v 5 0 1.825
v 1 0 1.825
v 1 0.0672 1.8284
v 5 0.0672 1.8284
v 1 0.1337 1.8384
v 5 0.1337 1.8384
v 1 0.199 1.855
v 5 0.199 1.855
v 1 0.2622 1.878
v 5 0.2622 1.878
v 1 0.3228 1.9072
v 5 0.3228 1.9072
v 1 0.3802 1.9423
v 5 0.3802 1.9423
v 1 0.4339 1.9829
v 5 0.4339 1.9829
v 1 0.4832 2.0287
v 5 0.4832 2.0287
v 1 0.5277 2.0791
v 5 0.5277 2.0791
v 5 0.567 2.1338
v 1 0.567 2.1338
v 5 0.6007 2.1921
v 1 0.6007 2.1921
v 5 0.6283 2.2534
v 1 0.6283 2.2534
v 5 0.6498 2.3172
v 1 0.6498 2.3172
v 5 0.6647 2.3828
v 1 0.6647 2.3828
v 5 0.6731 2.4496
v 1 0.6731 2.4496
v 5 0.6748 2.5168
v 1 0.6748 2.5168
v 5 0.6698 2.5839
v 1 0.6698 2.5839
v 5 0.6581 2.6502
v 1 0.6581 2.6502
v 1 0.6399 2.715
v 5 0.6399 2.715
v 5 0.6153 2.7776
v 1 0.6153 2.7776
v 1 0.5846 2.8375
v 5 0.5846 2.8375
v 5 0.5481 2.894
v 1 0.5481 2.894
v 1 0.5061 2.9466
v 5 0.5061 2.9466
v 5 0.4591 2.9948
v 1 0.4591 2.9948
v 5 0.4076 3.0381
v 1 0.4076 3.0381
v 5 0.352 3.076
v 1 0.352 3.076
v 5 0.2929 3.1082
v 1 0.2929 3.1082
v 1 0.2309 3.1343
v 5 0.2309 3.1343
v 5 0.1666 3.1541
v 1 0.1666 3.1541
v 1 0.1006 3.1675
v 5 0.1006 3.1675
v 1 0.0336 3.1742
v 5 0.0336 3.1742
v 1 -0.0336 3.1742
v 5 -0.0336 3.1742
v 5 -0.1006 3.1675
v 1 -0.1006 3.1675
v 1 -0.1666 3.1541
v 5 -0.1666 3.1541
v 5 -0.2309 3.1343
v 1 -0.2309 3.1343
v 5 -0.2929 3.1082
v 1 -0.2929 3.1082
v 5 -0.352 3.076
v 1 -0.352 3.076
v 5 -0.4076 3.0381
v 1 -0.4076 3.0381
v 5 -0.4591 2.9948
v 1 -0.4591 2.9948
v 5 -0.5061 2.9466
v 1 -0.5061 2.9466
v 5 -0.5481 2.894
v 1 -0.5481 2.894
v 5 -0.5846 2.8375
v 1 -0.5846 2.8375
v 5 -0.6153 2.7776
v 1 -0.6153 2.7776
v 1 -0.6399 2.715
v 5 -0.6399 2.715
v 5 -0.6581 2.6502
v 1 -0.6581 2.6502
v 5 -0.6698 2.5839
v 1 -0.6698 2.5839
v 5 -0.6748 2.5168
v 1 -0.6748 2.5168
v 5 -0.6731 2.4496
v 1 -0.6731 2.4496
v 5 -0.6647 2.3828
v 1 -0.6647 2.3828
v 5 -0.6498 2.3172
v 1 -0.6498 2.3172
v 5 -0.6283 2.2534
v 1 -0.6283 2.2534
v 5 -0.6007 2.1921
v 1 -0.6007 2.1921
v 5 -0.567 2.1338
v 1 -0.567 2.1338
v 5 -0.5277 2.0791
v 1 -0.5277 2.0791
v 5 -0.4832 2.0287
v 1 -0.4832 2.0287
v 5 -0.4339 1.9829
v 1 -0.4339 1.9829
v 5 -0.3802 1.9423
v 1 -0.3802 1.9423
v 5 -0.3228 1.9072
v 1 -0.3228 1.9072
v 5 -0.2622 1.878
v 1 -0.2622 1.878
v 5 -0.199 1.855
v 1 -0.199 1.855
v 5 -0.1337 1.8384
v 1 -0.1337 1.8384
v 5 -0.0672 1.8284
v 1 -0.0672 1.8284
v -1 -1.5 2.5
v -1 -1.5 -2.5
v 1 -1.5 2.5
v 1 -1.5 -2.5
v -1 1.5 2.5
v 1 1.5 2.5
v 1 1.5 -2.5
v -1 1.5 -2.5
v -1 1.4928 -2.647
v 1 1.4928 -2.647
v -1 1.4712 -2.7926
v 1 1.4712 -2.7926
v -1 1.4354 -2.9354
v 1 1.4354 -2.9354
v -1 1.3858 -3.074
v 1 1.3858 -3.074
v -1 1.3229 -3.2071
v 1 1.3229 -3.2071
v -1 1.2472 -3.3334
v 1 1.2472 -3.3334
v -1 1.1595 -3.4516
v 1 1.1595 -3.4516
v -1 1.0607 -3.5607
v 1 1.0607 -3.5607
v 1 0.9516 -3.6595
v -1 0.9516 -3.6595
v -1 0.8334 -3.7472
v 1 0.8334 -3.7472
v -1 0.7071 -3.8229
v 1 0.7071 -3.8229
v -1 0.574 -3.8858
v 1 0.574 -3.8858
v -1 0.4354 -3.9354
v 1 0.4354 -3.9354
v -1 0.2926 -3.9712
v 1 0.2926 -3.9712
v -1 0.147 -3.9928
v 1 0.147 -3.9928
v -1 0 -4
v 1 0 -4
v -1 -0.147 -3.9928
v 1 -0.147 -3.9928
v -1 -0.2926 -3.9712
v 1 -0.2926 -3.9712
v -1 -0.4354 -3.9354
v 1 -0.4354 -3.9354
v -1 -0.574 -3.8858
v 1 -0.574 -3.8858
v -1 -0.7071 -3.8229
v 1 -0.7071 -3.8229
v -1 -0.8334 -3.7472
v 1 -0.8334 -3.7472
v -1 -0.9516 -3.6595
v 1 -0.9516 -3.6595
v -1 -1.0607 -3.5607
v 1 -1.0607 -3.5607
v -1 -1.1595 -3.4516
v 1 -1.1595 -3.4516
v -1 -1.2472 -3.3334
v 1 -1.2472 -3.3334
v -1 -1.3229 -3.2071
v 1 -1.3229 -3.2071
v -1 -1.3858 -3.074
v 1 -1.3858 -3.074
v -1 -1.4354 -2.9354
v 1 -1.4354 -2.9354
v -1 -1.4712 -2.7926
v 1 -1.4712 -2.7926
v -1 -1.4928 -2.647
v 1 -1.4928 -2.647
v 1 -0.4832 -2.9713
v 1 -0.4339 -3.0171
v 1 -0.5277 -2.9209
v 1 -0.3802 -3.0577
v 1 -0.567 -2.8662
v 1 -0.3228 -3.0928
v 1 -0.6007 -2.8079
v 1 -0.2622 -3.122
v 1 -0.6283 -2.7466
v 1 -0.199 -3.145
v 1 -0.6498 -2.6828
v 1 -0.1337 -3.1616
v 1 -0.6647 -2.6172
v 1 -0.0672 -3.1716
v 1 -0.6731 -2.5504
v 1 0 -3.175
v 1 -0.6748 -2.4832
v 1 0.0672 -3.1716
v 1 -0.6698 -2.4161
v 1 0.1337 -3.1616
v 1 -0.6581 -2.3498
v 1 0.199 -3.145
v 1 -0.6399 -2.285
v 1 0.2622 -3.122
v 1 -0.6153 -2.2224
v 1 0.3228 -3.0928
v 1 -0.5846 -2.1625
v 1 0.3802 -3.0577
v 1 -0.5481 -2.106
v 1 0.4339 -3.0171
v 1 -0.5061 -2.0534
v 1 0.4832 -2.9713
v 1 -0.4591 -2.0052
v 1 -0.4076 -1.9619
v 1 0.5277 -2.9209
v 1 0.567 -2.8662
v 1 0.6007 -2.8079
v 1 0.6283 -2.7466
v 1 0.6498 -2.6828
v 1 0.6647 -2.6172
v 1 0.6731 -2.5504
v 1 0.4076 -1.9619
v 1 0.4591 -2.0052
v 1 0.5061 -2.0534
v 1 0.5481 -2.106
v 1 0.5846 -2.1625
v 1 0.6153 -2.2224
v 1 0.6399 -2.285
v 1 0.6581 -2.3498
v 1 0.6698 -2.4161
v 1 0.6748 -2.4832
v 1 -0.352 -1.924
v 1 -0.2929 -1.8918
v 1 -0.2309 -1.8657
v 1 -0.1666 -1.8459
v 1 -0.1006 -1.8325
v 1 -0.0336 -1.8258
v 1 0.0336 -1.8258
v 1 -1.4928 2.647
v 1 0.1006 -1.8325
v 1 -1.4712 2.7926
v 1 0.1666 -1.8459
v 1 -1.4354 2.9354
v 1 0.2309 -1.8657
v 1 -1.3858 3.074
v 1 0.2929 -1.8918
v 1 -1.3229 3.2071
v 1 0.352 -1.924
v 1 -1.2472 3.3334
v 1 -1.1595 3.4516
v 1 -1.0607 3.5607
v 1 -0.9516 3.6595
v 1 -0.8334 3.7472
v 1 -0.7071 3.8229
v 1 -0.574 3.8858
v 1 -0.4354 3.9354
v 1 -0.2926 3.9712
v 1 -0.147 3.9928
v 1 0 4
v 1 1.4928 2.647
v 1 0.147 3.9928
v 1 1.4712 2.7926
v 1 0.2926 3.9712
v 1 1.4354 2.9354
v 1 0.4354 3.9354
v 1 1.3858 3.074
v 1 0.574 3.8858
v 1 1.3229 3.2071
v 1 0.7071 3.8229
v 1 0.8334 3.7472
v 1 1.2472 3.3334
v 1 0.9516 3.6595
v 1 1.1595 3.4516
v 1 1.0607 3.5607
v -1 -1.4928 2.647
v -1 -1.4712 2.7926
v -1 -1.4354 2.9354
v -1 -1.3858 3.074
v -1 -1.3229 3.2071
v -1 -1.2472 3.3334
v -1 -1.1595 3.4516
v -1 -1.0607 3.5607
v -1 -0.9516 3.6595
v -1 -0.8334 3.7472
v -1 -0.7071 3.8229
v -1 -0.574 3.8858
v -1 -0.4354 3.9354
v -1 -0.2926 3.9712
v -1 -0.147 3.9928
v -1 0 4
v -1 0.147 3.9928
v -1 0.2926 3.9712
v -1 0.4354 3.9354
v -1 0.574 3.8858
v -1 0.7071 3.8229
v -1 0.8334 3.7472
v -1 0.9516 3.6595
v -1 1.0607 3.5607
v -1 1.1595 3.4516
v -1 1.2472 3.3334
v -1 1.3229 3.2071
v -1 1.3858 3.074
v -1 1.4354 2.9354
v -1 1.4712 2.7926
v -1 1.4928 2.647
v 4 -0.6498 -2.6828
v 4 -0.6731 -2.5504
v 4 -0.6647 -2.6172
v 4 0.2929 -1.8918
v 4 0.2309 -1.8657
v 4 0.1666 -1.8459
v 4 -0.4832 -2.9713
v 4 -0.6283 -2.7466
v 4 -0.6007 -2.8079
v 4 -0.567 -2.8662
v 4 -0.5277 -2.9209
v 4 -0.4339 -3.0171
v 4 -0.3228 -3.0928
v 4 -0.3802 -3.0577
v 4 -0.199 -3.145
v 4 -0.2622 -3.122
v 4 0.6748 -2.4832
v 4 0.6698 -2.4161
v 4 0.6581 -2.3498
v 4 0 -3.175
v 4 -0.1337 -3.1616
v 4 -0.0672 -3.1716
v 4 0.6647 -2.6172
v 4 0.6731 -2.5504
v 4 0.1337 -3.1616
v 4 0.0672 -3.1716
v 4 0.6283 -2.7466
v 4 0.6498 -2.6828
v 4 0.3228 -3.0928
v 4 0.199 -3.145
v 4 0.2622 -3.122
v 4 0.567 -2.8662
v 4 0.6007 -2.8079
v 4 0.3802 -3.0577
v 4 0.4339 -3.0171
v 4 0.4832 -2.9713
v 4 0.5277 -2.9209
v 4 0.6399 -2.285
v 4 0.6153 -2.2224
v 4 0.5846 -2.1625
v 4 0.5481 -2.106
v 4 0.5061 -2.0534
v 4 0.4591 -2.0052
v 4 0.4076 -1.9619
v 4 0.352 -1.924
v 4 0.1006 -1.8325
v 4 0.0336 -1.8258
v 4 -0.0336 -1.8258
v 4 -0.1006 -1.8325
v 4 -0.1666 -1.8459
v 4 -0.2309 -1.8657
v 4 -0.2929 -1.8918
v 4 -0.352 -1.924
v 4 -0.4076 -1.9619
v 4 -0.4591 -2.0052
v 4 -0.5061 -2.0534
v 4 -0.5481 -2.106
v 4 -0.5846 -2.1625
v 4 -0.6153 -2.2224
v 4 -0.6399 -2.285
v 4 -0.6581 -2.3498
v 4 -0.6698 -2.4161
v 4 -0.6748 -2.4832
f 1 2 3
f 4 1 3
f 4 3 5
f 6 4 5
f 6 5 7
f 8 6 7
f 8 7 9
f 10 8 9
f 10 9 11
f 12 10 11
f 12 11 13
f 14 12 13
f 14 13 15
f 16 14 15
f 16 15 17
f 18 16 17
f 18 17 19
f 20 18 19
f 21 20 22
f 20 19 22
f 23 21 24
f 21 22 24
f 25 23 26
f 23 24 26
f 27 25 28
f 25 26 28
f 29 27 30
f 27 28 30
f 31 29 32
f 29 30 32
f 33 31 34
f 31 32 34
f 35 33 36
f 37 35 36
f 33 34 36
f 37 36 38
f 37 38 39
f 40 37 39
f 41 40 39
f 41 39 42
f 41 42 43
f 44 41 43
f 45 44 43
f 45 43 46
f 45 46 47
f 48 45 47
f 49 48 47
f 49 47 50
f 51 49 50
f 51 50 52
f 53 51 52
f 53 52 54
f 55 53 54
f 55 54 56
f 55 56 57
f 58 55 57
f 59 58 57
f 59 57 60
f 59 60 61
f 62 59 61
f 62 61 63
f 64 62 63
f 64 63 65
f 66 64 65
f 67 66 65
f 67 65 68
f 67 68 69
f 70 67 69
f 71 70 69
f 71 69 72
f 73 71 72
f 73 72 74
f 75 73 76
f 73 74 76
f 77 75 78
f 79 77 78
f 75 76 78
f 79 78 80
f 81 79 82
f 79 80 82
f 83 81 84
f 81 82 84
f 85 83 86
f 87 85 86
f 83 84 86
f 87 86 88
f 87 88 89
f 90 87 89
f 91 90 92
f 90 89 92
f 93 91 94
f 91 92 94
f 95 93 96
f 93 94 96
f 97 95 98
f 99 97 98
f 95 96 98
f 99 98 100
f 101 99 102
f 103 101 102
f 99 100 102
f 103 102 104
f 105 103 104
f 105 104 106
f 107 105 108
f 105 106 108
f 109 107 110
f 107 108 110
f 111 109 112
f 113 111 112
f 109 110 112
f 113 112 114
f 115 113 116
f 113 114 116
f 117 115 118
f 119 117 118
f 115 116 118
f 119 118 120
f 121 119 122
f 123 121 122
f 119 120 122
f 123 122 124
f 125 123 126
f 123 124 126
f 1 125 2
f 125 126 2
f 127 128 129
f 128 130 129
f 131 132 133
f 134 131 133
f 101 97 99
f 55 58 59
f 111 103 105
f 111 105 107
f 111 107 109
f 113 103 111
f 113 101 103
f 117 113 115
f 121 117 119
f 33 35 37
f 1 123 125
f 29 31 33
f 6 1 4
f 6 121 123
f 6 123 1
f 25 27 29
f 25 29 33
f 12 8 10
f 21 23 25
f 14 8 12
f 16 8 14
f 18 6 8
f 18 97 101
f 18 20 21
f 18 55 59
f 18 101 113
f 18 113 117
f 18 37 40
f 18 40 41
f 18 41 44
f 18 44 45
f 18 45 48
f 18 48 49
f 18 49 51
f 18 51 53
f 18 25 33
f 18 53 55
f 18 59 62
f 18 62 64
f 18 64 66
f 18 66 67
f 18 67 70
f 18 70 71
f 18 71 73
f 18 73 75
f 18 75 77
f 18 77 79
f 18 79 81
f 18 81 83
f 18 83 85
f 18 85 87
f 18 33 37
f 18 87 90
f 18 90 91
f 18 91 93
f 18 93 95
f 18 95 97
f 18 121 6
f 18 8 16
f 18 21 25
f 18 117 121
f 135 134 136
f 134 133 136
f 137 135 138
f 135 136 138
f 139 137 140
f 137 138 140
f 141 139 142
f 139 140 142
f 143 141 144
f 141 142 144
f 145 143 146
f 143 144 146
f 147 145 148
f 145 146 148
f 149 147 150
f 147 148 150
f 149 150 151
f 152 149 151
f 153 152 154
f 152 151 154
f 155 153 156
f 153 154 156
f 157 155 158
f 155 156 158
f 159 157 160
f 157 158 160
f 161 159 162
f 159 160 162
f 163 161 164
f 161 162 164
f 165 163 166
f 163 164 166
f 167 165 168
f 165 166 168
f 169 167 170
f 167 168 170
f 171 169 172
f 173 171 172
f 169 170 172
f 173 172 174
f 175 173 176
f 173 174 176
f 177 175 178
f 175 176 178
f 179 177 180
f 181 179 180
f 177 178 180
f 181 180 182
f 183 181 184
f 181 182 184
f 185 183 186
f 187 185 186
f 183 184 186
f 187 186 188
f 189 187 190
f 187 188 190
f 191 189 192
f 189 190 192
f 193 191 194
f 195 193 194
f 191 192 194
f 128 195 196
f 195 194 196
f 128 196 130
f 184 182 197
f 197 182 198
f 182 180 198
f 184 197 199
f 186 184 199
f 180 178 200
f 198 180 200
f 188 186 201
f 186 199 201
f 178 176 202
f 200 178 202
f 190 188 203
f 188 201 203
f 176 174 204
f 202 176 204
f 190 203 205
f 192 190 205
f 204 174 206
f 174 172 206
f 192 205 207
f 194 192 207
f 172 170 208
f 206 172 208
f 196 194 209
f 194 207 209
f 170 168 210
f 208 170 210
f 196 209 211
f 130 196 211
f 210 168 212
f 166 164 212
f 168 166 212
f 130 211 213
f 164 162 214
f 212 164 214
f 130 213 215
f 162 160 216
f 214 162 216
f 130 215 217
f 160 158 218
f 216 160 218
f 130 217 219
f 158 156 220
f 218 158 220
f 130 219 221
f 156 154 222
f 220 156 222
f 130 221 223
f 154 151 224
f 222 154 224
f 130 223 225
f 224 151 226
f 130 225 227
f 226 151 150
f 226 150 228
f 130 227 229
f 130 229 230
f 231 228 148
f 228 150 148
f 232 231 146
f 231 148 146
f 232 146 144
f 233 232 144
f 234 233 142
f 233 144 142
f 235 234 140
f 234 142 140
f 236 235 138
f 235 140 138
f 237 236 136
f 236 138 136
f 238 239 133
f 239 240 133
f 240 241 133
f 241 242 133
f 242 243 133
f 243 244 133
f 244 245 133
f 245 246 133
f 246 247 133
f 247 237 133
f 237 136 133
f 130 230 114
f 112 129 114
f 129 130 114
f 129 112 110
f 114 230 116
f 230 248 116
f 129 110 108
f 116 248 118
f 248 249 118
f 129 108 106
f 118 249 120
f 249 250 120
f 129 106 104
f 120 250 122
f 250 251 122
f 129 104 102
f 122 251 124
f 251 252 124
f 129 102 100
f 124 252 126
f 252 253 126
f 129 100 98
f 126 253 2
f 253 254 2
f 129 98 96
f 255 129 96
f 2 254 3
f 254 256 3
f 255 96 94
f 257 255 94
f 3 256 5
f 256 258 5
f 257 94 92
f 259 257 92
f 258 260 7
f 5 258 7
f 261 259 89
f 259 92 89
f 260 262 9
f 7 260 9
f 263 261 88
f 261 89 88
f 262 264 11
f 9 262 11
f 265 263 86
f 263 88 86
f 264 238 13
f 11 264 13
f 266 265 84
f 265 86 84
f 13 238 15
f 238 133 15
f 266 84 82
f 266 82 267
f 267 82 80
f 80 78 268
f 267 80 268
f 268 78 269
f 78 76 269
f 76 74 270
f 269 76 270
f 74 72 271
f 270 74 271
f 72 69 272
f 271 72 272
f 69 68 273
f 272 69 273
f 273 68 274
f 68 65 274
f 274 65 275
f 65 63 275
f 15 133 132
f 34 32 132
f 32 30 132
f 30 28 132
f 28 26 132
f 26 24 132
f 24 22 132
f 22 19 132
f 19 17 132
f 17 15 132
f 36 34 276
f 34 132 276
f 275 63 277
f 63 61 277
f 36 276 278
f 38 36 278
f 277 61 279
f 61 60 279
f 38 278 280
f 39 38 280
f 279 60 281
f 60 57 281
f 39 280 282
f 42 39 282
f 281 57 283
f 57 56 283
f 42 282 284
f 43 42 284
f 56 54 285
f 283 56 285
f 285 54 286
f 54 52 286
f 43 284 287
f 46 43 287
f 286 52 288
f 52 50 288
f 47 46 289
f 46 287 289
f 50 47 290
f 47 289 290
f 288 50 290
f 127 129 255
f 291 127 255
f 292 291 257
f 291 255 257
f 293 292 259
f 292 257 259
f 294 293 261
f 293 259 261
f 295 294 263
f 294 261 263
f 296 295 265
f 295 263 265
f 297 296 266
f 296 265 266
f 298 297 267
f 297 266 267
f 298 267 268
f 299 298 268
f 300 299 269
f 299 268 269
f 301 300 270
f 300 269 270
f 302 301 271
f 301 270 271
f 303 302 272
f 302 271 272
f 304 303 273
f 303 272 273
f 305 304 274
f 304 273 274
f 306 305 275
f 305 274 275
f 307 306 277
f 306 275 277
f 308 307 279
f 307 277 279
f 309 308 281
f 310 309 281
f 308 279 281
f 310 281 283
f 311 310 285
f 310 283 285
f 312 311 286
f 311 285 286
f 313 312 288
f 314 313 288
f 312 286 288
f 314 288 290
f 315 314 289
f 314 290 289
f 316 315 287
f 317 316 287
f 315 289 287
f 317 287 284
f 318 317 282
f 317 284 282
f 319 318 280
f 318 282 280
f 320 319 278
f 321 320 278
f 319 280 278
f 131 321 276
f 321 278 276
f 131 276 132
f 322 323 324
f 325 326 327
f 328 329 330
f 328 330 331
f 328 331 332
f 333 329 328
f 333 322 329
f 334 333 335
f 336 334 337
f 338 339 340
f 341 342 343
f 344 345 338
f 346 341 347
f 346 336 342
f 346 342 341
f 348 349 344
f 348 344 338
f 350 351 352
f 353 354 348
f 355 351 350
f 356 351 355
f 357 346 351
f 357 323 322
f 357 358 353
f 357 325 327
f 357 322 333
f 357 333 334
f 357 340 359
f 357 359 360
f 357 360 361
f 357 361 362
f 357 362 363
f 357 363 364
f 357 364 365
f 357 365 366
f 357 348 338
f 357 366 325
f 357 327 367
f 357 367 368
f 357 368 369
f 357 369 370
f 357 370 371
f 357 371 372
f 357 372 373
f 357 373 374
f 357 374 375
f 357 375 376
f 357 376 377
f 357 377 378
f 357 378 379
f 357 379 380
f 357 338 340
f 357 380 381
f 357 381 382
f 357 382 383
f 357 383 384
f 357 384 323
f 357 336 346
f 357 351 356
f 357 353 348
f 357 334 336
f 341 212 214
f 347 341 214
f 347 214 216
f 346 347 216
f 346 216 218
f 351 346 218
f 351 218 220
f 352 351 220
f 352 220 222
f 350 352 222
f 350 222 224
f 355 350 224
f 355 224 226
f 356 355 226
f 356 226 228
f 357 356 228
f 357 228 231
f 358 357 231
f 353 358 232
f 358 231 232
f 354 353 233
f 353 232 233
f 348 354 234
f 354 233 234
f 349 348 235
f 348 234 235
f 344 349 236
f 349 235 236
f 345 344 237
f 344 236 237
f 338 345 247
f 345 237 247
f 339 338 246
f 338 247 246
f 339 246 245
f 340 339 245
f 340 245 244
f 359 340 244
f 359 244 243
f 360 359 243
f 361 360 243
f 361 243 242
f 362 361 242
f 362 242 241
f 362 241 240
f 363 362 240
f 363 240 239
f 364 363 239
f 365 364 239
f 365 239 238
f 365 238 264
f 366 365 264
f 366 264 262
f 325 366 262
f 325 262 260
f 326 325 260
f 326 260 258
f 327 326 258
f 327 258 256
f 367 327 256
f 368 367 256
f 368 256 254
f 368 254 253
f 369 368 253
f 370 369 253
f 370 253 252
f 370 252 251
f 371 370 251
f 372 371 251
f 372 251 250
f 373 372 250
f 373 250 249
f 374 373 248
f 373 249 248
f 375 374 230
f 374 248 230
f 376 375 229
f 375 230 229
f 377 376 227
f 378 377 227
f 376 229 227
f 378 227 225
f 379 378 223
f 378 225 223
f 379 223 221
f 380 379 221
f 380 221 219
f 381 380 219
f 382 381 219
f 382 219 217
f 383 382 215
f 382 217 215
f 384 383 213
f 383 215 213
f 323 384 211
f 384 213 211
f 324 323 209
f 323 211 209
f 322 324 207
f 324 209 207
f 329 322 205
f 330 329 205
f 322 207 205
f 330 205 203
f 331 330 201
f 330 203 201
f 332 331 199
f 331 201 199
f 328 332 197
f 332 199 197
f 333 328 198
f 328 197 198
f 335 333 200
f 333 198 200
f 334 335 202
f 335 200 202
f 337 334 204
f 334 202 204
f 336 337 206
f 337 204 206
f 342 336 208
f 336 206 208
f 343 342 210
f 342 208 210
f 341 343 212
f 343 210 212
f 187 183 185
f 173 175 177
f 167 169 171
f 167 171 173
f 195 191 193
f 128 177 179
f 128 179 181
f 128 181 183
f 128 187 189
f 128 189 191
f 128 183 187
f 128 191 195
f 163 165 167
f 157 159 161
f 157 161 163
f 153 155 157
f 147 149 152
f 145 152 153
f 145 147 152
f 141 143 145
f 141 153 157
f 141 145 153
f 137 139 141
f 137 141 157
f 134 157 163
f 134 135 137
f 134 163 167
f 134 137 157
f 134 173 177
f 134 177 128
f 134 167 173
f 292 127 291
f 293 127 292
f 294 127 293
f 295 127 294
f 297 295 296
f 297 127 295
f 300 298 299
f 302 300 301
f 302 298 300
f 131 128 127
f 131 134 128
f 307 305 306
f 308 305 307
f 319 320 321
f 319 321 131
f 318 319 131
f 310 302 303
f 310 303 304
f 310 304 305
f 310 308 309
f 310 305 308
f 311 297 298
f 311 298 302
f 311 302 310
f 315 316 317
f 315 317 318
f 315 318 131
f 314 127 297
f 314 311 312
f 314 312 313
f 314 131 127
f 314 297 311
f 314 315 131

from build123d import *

# Parameters (mm, degrees)
BOSS_EXTRUDE1_DEPTH = 1
SKETCH2_R           = 0.675
BOSS_EXTRUDE2_DEPTH = 5
SKETCH3_R           = 0.675
BOSS_EXTRUDE3_DEPTH = 4


with BuildPart() as part:
    # Sketch1 → Boss-Extrude1 (new, symmetric)
    with BuildSketch(Plane(origin=(0, 0, 0), x_dir=(0, 0, -1), z_dir=(1, 0, 0))):
        with BuildLine():
            Line((-2.5, 1.5), (2.5, 1.5))
            ThreePointArc((2.5, 1.5), (4, 0), (2.5, -1.5))
            Line((2.5, -1.5), (-2.5, -1.5))
            ThreePointArc((-2.5, -1.5), (-4, 0), (-2.5, 1.5))
        make_face()
    extrude(amount=BOSS_EXTRUDE1_DEPTH, both=True)

    # Sketch2 → Boss-Extrude2 (add)
    with BuildSketch(Plane(origin=(0, 0, 0), x_dir=(0, 0, -1), z_dir=(1, 0, 0))):
        with Locations((-2.5, 0)):
            Circle(SKETCH2_R)
    extrude(amount=BOSS_EXTRUDE2_DEPTH)

    # Sketch3 → Boss-Extrude3 (add)
    with BuildSketch(Plane(origin=(0, 0, 0), x_dir=(0, 0, -1), z_dir=(1, 0, 0))):
        with Locations((2.5, 0)):
            Circle(SKETCH3_R)
    extrude(amount=BOSS_EXTRUDE3_DEPTH)


solid = part.part
